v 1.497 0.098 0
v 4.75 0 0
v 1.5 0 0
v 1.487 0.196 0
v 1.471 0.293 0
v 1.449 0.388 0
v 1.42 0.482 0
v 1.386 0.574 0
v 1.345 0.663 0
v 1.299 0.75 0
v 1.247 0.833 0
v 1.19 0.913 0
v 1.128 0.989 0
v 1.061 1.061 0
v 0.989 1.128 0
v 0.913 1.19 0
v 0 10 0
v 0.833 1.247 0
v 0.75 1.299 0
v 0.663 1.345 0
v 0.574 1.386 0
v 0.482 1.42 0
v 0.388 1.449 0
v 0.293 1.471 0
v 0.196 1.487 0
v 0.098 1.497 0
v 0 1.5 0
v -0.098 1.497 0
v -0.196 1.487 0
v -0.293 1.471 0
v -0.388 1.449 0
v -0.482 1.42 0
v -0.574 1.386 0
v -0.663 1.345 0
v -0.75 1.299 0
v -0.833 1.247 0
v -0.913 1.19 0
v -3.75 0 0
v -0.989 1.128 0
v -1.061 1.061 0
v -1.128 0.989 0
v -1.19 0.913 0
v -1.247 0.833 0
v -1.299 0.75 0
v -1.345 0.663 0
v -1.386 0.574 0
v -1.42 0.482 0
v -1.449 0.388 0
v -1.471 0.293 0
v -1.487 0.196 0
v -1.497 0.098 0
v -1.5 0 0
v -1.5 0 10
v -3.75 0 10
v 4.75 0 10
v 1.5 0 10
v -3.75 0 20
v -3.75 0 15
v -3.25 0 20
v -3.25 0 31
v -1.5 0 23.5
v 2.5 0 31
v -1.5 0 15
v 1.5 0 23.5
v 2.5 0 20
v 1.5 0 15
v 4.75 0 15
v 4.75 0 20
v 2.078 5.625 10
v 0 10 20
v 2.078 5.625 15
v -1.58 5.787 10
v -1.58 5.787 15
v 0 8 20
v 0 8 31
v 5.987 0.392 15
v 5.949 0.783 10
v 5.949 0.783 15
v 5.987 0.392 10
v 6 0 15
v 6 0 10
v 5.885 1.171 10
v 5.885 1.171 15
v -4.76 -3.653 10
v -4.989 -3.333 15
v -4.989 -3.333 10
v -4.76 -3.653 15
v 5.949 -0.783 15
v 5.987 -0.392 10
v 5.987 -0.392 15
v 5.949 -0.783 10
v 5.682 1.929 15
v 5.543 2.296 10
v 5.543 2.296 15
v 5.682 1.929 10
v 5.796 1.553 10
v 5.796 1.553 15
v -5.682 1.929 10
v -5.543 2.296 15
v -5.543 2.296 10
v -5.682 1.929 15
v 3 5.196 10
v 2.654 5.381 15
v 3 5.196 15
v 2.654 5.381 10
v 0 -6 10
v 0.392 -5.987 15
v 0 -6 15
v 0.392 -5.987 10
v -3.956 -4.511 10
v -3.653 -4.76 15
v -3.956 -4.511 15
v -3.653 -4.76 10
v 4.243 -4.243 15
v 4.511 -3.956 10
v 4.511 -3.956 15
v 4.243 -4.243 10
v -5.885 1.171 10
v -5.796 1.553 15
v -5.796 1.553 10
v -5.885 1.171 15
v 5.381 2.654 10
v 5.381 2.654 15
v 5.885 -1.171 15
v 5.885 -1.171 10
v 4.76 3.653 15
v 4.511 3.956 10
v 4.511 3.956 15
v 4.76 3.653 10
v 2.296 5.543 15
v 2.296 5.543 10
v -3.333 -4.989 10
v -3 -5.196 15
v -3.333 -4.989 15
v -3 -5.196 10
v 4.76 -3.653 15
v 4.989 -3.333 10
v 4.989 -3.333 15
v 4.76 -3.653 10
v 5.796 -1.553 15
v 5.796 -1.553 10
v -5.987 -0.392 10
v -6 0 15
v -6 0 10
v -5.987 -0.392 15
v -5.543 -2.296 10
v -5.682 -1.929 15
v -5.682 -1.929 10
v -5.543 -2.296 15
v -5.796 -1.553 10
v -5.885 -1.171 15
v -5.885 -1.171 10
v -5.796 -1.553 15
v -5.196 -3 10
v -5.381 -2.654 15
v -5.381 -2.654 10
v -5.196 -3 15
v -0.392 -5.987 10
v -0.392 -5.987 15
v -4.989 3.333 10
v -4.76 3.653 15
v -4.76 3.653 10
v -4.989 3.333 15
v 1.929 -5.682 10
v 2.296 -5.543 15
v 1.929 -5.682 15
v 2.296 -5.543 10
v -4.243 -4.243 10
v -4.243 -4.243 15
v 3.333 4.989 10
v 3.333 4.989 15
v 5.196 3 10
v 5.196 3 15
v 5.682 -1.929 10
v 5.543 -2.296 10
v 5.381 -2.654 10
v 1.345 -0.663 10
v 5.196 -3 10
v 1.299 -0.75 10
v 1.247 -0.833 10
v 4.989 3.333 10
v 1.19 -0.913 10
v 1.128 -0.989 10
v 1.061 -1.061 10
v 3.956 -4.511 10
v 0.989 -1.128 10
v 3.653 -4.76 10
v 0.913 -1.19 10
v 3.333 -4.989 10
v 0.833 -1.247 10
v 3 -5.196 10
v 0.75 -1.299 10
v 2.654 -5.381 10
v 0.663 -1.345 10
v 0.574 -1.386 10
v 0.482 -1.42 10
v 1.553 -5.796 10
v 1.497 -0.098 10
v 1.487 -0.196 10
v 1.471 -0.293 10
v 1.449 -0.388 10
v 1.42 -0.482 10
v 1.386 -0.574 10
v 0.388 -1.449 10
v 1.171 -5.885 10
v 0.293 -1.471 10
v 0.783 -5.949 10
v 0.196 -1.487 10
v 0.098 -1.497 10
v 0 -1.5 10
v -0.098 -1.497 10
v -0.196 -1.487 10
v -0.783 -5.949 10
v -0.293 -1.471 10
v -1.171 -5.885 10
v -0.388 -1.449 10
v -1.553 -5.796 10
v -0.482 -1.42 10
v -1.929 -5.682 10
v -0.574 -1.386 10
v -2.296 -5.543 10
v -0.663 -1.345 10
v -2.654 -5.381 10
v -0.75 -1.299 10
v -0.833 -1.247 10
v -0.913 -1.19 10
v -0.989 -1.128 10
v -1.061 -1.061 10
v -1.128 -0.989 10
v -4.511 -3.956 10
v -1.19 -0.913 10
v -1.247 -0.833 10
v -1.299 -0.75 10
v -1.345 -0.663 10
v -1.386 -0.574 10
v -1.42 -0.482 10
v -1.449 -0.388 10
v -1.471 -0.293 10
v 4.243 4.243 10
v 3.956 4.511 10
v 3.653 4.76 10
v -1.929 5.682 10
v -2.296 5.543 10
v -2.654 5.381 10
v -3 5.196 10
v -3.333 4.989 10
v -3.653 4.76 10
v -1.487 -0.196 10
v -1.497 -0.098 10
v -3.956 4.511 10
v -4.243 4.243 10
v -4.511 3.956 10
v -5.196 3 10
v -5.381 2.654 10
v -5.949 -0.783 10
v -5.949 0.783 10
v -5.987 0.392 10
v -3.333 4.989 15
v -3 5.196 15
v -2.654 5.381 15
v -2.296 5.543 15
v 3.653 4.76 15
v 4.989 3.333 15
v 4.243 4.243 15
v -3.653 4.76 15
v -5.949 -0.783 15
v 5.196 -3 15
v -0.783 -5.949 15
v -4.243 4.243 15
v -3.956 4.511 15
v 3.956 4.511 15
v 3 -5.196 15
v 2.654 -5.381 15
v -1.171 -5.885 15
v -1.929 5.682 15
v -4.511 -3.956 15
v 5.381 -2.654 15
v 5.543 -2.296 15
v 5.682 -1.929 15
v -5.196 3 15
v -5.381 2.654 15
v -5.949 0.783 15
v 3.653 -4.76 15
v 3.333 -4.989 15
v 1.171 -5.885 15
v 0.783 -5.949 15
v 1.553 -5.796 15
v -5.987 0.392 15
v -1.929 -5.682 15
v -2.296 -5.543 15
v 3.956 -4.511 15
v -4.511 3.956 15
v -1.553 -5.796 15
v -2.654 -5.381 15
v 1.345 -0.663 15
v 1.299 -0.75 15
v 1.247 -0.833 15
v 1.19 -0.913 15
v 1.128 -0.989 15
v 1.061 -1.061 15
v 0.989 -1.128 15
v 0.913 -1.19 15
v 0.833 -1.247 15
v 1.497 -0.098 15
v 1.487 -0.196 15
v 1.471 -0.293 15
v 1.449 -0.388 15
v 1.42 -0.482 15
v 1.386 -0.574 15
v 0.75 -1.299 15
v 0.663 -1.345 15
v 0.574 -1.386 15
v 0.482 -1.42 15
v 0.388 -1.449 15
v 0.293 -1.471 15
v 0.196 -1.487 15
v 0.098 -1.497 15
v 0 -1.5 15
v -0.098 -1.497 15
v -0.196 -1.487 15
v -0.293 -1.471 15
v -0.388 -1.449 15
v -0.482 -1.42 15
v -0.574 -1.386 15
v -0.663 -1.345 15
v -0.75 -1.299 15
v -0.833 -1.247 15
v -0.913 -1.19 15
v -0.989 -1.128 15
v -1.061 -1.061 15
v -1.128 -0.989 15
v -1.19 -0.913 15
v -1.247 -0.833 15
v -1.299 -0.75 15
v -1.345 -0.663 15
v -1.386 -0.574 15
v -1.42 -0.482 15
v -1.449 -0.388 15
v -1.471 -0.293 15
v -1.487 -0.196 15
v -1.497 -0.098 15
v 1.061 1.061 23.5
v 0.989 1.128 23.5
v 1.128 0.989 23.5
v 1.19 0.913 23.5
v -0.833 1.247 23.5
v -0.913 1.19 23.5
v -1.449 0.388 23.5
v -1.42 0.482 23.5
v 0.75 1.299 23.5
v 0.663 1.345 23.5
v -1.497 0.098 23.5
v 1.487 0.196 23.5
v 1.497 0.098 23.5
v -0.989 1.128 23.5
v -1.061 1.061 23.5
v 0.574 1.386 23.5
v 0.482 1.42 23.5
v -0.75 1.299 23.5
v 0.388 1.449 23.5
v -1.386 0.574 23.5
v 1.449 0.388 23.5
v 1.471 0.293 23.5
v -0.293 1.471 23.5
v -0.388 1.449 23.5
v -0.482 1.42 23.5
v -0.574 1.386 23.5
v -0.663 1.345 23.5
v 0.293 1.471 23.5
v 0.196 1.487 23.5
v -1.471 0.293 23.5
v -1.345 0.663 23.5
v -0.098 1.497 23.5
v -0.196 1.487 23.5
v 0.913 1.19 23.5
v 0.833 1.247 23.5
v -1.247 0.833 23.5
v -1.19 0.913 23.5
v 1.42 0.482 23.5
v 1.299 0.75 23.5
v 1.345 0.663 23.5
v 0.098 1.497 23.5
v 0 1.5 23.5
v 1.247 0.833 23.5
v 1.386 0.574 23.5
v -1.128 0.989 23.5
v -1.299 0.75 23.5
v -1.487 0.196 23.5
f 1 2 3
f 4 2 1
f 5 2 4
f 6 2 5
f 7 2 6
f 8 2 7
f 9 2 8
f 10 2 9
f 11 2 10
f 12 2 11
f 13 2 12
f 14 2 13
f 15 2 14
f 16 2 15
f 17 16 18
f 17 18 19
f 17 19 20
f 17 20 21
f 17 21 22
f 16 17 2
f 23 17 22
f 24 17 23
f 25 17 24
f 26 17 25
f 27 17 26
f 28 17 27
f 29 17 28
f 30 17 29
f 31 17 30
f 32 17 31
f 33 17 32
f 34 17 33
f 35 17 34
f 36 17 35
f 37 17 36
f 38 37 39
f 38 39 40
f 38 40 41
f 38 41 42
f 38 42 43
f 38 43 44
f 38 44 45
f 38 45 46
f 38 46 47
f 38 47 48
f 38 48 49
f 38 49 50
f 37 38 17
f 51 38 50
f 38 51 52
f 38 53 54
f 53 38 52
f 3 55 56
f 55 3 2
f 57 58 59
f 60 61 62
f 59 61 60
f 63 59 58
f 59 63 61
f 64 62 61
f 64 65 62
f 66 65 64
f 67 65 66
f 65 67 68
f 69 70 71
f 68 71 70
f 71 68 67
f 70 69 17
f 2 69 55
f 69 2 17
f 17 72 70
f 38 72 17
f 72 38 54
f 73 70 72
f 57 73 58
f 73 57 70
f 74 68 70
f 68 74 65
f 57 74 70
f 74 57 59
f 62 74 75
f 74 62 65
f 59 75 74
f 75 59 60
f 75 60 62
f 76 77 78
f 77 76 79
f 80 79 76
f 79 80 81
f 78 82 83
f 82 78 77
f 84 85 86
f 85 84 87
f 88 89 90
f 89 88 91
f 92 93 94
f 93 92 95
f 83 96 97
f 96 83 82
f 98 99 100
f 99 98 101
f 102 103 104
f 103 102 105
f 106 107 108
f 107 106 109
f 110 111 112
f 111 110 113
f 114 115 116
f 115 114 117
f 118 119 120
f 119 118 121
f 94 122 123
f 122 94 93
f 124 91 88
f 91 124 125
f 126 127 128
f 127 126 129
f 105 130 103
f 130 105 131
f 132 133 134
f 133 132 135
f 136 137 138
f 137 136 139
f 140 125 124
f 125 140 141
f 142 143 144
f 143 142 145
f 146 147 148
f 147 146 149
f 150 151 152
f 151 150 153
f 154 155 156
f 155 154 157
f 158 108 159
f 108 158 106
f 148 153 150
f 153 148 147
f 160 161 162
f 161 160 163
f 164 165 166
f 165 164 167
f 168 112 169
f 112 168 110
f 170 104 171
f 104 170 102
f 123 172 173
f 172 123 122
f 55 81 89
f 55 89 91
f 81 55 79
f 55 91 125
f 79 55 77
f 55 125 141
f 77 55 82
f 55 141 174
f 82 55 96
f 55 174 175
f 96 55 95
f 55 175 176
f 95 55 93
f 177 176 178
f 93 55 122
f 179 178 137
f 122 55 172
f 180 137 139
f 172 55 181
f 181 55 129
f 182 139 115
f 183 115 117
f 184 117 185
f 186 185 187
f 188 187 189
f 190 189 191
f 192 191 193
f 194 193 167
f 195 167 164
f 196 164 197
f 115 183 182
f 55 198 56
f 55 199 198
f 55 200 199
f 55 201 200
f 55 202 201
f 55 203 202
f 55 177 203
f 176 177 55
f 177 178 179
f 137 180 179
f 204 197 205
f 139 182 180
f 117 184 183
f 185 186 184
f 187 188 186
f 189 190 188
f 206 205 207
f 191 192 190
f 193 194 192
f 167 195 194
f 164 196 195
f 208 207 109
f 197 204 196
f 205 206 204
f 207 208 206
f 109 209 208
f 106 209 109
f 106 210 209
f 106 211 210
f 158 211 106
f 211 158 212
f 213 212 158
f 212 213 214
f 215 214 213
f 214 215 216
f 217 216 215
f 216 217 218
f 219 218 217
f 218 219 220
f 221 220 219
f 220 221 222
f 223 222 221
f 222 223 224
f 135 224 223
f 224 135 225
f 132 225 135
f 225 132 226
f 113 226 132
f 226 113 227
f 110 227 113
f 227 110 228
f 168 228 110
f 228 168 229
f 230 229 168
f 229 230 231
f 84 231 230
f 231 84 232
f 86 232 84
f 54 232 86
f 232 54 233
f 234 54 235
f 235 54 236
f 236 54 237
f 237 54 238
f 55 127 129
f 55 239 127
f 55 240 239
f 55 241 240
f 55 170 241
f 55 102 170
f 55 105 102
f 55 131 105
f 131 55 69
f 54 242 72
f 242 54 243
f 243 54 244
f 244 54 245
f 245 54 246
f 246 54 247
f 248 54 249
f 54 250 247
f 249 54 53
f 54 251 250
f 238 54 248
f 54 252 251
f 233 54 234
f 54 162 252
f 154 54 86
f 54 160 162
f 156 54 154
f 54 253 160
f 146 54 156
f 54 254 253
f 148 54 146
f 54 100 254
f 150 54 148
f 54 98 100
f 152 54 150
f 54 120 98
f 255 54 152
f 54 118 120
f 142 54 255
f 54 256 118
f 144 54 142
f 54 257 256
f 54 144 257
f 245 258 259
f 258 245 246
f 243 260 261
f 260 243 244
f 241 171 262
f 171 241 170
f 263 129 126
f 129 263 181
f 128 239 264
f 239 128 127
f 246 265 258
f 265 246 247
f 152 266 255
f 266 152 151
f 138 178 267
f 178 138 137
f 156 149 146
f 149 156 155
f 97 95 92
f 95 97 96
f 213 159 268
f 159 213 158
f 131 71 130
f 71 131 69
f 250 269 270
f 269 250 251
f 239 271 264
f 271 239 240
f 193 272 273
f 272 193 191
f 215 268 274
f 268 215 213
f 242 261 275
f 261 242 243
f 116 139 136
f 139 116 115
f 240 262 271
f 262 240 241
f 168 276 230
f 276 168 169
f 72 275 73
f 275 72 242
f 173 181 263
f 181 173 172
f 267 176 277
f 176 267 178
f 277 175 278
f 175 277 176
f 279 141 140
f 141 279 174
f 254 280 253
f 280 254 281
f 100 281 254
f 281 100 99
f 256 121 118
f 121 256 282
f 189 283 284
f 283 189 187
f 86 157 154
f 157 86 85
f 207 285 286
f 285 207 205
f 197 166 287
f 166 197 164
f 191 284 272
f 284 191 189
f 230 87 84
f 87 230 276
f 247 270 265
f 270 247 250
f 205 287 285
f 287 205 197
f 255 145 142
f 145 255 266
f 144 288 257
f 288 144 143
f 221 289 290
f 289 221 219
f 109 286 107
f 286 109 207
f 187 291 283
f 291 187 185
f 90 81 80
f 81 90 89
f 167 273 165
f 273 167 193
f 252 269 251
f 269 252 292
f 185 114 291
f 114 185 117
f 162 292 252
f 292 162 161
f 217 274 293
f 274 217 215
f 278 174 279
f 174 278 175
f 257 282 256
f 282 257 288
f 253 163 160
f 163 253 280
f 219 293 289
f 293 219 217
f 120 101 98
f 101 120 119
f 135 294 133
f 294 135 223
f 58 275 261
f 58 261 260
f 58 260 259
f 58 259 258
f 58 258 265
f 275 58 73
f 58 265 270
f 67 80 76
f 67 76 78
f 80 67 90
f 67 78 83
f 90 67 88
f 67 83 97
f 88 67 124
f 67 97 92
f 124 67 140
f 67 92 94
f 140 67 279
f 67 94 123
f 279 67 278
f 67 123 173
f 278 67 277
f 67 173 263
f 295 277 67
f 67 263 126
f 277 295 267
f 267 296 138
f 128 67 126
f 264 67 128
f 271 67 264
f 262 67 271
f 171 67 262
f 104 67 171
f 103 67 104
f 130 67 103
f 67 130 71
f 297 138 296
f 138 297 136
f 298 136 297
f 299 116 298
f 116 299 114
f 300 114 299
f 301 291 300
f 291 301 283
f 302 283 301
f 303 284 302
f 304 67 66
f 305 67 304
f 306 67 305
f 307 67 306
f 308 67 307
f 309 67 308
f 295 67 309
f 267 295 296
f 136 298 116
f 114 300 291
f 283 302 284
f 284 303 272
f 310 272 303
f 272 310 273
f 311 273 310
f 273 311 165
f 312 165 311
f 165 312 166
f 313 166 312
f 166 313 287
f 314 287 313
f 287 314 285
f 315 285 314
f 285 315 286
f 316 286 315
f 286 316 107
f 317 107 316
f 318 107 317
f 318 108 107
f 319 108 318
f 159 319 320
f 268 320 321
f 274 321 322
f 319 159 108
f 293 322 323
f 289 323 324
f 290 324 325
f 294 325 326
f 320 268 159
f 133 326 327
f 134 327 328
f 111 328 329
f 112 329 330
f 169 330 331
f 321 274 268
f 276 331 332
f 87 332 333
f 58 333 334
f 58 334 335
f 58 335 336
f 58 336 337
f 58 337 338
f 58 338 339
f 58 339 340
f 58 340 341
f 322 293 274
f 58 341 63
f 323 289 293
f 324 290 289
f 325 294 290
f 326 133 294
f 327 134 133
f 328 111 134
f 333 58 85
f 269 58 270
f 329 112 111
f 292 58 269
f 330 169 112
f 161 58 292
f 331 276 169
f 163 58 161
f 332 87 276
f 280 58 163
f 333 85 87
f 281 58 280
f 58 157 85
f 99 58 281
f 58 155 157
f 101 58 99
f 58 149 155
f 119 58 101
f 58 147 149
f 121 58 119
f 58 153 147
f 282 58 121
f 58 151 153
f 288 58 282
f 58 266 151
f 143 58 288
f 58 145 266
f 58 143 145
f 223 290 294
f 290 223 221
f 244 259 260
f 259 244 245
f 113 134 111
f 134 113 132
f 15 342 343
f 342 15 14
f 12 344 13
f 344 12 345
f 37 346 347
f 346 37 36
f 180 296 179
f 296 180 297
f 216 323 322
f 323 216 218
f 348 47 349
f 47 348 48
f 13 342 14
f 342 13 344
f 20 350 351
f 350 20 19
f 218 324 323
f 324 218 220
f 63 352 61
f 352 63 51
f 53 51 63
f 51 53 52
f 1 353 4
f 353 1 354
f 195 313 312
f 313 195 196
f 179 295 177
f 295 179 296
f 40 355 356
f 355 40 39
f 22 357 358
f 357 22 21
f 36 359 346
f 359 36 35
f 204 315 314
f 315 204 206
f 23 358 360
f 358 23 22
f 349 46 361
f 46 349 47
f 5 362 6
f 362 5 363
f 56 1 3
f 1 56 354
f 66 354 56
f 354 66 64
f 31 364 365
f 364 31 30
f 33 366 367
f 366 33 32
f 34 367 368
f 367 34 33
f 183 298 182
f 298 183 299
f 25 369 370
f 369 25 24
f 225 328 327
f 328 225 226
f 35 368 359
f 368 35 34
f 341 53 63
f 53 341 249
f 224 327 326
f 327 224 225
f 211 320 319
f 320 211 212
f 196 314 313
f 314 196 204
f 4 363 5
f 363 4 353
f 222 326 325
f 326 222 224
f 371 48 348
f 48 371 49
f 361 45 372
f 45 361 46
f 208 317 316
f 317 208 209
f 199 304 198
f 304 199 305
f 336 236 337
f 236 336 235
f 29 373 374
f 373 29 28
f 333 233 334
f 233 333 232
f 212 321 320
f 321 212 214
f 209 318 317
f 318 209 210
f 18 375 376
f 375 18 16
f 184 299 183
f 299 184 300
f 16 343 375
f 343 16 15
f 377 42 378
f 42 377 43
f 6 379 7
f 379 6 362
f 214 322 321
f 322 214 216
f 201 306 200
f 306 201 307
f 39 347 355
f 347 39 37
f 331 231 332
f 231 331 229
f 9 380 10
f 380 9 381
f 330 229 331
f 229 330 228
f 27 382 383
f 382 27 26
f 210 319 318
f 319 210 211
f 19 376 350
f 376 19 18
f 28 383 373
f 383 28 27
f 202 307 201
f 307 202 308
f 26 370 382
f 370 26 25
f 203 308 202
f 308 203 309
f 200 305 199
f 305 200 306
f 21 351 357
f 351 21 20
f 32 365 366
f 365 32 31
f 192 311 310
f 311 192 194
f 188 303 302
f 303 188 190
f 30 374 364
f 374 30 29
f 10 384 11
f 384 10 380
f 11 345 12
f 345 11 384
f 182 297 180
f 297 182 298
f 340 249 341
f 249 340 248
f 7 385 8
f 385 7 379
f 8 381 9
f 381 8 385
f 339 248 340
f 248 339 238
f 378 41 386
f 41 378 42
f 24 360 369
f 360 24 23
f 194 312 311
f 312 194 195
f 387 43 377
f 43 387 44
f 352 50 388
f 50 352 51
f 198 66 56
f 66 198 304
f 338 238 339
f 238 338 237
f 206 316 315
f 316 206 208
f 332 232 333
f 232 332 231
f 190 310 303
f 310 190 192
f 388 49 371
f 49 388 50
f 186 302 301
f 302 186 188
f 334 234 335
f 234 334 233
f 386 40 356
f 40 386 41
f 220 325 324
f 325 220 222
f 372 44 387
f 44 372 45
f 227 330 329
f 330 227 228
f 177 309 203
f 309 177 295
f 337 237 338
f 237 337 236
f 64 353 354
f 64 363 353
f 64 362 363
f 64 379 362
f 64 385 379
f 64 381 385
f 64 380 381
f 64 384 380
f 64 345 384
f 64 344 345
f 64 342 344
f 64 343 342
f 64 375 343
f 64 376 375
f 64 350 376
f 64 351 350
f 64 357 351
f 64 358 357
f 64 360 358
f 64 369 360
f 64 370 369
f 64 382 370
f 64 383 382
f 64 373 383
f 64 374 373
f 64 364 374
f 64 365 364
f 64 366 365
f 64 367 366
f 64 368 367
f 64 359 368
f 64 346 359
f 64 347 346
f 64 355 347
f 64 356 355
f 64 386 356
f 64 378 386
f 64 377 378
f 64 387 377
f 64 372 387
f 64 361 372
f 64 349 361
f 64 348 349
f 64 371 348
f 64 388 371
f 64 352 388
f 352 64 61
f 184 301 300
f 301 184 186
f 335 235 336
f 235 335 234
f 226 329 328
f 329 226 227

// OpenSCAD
// Hose-barb reducer: 8 mm tubing (barbs A) -> collar -> 5 mm tubing (barbs B)
// Print orientation: standing upright along Z, centred on origin in X/Y

$fn = 96;

// ---- Dimensions (mm) ----
bore      = 3;    // through-bore diameter
barb_a_h  = 10;   // height of each 8 mm barb
barb_a_d  = 7.5;  // outer diameter of 8 mm barb (bottom)
barb_a_dt = 9.5;  // outer diameter of 8 mm barb (top)
collar_d  = 12;   // collar diameter
collar_h  = 5;    // collar height (z = 20 to 25)
barb_b_h  = 8;    // height of each 5 mm barb
barb_b_d  = 6.5;  // outer diameter of 5 mm barb (bottom)
barb_b_dt = 5;    // outer diameter of 5 mm barb (top)
eps       = 0.5;  // overcut for clean differences

// ---- Derived ----
z0 = 0;           // start of barbs A
z2 = z0 + barb_a_h; // bottom of collar (top of barbs A)
z5 = z2 + collar_h; // top of collar (bottom of barbs B)
zn = z5 + barb_b_h; // end of barbs B

// ---- Model ----
difference() {
    union() {
        // Barbs for 8 mm tubing
        for (i = [0 : 1])
            translate([0, 0, z0 + i * barb_a_h])
                linear_extrude(height = barb_a_h)
                    polygon([
                        [-barb_a_d / 2, 0],
                        [ barb_a_dt / 2, 0],
                        [ 0, barb_a_h]
                    ]);

        // Collar
        translate([0, 0, z2])
            cylinder(d = collar_d, h = collar_h);

        // Barbs for 5 mm tubing
        for (i = [0 : 1])
            translate([0, 0, z5 + i * barb_b_h])
                linear_extrude(height = barb_b_h)
                    polygon([
                        [-barb_b_d / 2, 0],
                        [ barb_b_dt / 2, 0],
                        [ 0, barb_b_h]
                    ]);
    }

    // Through-bore
    translate([0, 0, z0 - eps])
        cylinder(d = bore, h = zn + 2 * eps);
}
